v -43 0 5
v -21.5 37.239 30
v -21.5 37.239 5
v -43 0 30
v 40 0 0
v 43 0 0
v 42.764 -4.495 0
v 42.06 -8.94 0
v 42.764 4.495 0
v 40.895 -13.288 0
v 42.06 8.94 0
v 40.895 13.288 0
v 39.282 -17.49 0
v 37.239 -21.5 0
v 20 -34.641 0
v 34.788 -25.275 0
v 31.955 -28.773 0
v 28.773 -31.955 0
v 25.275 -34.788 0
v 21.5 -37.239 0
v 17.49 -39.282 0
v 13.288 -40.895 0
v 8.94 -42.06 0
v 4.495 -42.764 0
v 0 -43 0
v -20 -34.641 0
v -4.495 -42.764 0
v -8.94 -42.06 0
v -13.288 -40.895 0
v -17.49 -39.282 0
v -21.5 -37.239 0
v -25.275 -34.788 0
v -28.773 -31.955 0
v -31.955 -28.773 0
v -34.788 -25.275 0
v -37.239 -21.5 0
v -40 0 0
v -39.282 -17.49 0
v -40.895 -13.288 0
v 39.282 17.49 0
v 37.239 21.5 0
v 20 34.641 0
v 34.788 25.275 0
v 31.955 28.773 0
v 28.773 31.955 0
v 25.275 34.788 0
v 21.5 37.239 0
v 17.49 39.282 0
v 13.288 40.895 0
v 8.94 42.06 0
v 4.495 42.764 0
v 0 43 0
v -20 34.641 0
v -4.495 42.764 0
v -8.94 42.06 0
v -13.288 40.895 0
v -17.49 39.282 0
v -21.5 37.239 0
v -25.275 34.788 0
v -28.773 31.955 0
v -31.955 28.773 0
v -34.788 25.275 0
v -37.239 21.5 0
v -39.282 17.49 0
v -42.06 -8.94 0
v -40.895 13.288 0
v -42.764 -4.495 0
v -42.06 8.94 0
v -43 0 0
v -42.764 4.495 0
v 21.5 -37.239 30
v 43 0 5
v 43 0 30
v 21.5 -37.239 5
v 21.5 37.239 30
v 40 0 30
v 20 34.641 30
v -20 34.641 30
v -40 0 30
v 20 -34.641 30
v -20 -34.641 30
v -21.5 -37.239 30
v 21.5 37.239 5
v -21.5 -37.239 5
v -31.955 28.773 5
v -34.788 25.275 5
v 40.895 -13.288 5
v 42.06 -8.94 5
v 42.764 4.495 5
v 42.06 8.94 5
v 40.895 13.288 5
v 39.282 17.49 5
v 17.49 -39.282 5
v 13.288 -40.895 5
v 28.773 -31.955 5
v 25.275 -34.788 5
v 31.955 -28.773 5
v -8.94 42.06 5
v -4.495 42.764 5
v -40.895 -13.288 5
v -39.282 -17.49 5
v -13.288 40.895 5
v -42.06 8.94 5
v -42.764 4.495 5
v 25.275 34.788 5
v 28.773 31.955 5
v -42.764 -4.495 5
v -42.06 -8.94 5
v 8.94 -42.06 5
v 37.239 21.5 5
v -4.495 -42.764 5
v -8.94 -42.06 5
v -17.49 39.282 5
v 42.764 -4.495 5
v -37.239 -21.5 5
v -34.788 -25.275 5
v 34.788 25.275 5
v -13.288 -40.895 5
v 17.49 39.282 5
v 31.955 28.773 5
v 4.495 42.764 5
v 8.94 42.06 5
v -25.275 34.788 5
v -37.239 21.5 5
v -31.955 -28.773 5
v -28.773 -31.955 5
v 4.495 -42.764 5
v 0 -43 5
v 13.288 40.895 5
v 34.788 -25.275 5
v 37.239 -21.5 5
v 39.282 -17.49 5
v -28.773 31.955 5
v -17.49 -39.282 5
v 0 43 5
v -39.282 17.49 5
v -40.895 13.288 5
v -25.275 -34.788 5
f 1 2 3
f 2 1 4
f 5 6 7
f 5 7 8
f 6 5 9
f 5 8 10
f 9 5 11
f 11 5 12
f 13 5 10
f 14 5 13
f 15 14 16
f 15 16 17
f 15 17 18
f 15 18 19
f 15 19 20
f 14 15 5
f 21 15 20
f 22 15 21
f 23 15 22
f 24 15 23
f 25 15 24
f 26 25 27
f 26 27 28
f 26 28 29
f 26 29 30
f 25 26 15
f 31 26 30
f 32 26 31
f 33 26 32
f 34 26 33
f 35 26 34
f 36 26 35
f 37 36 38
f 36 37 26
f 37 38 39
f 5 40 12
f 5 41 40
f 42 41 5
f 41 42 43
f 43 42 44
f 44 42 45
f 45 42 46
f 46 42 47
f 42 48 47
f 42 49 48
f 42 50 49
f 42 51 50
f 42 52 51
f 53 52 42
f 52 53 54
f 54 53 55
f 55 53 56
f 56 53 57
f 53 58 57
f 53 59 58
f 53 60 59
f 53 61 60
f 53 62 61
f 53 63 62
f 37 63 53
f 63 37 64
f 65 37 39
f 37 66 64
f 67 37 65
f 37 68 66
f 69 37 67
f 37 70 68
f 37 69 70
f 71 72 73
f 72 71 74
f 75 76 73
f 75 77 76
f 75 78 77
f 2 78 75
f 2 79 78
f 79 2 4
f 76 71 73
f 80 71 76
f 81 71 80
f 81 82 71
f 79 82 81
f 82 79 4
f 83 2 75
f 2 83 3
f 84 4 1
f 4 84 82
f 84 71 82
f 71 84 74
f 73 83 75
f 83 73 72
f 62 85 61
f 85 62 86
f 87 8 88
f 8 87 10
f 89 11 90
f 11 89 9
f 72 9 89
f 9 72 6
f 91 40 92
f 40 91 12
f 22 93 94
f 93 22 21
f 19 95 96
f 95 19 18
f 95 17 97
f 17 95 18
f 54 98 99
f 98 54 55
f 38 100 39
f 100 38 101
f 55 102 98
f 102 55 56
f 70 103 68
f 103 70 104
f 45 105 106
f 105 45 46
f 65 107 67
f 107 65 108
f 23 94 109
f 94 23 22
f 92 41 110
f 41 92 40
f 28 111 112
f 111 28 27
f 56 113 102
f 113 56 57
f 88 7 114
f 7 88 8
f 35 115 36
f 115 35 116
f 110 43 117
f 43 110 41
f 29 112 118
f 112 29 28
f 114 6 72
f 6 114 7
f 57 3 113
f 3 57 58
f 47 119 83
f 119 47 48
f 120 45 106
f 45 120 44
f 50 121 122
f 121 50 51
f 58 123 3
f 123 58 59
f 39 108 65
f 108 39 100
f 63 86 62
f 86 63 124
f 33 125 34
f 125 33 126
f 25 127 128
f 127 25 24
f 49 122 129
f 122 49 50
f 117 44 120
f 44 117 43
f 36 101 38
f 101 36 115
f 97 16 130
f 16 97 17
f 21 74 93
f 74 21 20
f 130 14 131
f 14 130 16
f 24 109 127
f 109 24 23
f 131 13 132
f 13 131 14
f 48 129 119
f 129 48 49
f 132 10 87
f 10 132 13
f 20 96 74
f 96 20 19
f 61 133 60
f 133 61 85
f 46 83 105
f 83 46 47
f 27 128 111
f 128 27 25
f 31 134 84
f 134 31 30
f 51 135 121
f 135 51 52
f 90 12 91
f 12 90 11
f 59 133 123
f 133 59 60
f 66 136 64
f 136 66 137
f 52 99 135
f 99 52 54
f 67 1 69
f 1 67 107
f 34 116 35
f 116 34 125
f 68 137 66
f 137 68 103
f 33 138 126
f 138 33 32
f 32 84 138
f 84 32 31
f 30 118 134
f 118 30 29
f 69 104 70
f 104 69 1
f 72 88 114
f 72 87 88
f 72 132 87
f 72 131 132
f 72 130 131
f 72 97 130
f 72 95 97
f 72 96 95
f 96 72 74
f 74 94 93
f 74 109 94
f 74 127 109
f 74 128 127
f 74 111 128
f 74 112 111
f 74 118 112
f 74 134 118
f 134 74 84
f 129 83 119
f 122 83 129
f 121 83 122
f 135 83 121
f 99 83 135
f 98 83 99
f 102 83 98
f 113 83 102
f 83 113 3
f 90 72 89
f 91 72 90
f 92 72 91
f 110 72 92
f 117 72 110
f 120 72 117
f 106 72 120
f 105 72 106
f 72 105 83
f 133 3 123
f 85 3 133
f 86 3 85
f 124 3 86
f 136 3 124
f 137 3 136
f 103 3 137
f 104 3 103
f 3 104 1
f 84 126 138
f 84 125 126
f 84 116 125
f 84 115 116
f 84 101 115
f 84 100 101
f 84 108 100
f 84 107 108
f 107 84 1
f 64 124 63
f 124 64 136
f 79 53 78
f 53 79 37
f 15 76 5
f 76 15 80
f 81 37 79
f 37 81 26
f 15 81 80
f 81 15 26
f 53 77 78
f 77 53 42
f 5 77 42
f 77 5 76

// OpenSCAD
// [FL_INDEX: keywords="openscad, 3d_parametric, Polygon_Cutter_parametric, csg_solid" | COT="Parametric OpenSCAD design from 3DCodeverse"]
// Title: Polygon Cutter parametric

//Polygon sides
polysides=6; // [5:20]

//Height of cutter
cutterheight=30; // [5:50]

//Radius of inner cutter
cutterradius = 40;// [5:100]

//Wall thickness
wallthick = 3; // [1:10]

//Base height
baseheight = 5; // [0:10]

/* [Hidden] */
$fn=60;
cutterradius_o = cutterradius+wallthick;

difference() {
	union() {
			
		linear_extrude(height=cutterheight) circle(r=cutterradius_o,$fn=polysides);
			
		cylinder(h=baseheight,r=cutterradius_o);
	}

translate([0,0,-10]) linear_extrude(height=cutterheight+20) circle(r=cutterradius,$fn=polysides);

}
